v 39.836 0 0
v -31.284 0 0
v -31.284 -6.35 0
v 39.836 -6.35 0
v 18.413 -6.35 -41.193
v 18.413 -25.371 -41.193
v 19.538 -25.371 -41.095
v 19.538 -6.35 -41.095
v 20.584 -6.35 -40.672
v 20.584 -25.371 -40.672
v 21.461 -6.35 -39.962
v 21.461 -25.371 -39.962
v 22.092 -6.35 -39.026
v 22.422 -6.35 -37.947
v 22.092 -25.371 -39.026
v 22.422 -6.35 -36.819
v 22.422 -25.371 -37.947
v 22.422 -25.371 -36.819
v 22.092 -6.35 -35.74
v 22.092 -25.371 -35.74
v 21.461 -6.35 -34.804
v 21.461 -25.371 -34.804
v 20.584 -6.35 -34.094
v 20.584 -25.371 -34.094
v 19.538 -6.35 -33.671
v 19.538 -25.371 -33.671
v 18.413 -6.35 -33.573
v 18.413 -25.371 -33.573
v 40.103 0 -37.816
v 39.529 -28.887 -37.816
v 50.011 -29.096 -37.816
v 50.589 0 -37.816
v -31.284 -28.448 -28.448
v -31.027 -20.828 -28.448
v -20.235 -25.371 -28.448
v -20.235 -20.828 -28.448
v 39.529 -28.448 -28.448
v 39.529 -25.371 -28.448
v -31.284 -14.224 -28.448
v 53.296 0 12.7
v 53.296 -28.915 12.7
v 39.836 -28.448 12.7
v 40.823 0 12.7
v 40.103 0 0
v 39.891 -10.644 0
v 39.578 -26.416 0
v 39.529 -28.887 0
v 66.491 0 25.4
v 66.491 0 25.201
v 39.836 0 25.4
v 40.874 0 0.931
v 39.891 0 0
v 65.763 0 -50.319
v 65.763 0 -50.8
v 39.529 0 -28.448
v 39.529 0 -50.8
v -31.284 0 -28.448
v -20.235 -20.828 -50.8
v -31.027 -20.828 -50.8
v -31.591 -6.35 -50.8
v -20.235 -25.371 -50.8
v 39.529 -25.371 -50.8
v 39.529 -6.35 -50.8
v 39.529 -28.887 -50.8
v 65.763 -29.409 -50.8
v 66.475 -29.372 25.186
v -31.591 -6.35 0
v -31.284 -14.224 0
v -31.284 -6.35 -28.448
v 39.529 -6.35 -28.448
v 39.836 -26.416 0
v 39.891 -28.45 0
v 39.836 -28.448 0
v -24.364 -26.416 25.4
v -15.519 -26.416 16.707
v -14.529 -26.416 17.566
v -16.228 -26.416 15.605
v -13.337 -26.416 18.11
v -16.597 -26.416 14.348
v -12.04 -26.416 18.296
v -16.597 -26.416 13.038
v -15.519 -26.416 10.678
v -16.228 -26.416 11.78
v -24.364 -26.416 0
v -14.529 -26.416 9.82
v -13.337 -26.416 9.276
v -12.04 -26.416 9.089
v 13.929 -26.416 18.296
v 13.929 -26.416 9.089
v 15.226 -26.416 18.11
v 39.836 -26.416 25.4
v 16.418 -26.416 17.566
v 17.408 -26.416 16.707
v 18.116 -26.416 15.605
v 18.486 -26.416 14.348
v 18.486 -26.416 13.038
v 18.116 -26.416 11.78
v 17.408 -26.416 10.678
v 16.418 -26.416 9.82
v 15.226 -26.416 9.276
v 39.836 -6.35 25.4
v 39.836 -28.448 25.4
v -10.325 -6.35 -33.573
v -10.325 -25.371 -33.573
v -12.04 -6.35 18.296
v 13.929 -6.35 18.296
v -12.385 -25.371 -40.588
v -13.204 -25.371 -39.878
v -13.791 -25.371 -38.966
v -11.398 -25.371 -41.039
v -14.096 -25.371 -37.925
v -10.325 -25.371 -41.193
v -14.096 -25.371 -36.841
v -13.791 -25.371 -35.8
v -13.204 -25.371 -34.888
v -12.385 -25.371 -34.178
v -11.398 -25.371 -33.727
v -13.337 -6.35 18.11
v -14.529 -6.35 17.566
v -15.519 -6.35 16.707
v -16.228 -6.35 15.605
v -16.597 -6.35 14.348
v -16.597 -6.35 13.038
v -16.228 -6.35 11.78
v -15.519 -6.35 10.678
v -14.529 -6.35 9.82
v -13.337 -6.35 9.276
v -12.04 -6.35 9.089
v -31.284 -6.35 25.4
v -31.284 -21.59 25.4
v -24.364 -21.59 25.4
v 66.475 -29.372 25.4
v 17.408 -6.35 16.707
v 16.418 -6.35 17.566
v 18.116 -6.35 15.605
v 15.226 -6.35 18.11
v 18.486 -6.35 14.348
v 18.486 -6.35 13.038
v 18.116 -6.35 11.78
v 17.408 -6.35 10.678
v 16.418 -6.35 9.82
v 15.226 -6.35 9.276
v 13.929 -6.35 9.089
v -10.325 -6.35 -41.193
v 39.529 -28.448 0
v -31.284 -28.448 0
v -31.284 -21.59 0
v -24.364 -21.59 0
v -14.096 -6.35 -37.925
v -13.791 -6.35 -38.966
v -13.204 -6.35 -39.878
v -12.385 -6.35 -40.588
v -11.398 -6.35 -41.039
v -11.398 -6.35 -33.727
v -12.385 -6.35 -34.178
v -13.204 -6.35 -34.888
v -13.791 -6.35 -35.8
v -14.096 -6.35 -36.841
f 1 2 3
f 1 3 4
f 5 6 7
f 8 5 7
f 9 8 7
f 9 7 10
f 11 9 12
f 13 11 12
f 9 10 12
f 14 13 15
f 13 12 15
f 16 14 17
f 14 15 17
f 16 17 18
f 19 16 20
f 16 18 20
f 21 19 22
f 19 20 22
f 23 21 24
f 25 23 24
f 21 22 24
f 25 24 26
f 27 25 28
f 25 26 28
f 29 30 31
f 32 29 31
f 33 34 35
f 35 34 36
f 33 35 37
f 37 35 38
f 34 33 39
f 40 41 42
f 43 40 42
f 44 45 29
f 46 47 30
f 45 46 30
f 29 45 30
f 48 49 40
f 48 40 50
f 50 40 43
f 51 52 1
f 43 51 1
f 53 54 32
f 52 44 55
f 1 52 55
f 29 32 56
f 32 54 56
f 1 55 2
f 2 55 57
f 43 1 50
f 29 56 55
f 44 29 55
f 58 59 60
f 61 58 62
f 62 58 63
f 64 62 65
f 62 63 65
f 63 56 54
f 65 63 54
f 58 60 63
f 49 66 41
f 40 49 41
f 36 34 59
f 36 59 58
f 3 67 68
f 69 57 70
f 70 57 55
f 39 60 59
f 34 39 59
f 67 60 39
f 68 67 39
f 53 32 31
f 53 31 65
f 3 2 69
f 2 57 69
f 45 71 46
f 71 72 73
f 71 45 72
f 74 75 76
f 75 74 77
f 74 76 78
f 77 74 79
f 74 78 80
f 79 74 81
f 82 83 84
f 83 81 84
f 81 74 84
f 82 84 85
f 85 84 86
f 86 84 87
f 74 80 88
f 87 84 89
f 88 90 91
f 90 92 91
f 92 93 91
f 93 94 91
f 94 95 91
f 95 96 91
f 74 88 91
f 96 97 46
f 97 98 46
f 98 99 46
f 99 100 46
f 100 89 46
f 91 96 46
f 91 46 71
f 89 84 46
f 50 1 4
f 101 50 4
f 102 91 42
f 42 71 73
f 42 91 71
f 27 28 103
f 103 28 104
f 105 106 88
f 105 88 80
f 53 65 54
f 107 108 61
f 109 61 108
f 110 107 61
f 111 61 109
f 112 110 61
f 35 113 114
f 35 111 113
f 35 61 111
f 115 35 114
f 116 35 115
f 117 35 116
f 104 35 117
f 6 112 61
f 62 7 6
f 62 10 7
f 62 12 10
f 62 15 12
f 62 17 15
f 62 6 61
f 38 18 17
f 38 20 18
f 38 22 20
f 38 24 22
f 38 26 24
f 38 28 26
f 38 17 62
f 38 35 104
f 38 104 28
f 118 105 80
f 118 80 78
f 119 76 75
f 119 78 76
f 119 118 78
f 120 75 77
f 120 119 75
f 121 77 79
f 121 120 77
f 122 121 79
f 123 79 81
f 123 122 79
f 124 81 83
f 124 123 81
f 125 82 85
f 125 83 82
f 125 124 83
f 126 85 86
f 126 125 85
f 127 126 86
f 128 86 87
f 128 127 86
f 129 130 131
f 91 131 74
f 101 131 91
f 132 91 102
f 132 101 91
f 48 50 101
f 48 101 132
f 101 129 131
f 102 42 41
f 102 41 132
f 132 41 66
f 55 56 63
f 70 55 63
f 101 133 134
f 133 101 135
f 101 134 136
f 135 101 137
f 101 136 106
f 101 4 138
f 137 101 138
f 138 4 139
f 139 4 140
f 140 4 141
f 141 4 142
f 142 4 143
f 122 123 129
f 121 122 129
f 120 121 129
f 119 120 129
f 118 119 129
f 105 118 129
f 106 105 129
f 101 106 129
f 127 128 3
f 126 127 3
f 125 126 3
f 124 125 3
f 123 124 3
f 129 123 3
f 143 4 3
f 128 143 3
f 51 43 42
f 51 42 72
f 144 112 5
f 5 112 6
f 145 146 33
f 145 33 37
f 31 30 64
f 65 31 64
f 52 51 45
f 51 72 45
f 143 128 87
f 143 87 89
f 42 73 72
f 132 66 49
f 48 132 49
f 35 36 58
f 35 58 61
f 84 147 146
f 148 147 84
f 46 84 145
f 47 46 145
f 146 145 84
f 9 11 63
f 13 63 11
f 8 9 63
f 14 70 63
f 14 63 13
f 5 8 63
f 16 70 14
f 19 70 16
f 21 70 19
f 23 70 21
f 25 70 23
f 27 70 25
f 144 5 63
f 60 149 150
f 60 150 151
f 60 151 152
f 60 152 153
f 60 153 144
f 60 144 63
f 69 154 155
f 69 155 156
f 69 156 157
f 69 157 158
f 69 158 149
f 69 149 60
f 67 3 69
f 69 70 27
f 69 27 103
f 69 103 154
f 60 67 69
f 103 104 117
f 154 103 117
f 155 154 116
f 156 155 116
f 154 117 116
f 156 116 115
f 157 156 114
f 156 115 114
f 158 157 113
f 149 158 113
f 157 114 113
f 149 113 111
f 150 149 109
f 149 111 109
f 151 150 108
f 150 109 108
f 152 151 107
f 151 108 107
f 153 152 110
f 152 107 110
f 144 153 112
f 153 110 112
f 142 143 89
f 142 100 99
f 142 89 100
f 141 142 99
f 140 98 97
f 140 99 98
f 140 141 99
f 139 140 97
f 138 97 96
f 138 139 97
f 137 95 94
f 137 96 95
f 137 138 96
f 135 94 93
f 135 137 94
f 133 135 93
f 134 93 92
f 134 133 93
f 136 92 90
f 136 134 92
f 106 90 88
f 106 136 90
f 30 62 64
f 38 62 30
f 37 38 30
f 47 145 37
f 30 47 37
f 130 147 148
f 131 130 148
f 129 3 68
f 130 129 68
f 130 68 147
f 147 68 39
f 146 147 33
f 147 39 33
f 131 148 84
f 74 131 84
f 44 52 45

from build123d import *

# Parameters (mm, degrees)
F0_W      = 71.12
F0_H      = 28.448
F1_DEPTH  = 28.448
F3_DEPTH  = 25.4
F4_DEPTH  = 25.4
F6_DEPTH  = 29.3733245078
F8_DEPTH  = 29.3562148671
F9_W      = 26.5992027439
F9_H      = 25.4
F10_DEPTH = 29.3562148671
F12_DEPTH = 50.8
F14_DEPTH = 25.3715035059
F16_DEPTH = 29.4182237139
F18_DEPTH = 29.4182237139


with BuildPart() as f1:
    # F0 (on Front) → F1 (new body)
    with BuildSketch(Plane.XZ):
        with Locations((4.2755420916, -14.224)):
            Rectangle(F0_W, F0_H)
    extrude(amount=F1_DEPTH)

    # F2 (on face) → F3 (join)
    with BuildSketch(Plane.XY):
        Polygon((39.8355420916, -6.35), (-31.2844579084, -6.35), (-31.2844579084, -21.59), (-24.3643354625, -21.59), (-24.3643354625, -26.416), (39.8355420916, -26.416), align=None)
        Polygon((39.8355420916, 0), (39.8355420916, -6.35), (39.8355420916, -26.416), (39.8355420916, -28.448), (66.4746039532, -29.3723245078), (66.4906352758, 0), align=None)
    extrude(amount=-F3_DEPTH)

    # F2 (on face) → F4 (join)
    with BuildSketch(Plane.XY):
        Polygon((39.8355420916, -6.35), (-31.2844579084, -6.35), (-31.2844579084, -21.59), (-24.3643354625, -21.59), (-24.3643354625, -26.416), (39.8355420916, -26.416), (39.8355420916, -28.448), (66.4746039532, -29.3723245078), (66.4906352758, 0), (39.8355420916, 0), align=None)
    extrude(amount=F4_DEPTH)

    # F5 (on Front) → F6 (cut, through all)
    with BuildSketch(Plane.XZ):
        with BuildLine():
            Line((13.9288037957, 18.2963101068), (-12.0401520726, 18.2963101068))
            ThreePointArc((-12.0401520726, 18.2963101068), (-16.6437398491, 13.6927223303), (-12.0401520726, 9.0891345539))
            Line((-12.0401520726, 9.0891345539), (13.9288037957, 9.0891345539))
            ThreePointArc((13.9288037957, 9.0891345539), (18.5323915722, 13.6927223303), (13.9288037957, 18.2963101068))
        make_face()
        Polygon((69.9178975219, 28.448), (39.8913989174, 0), (69.9178975219, 0), align=None)
    extrude(amount=F6_DEPTH, mode=Mode.SUBTRACT)

    # F7 (on face) → F8 (cut, through all)
    with BuildSketch(Plane(origin=(-0.9380015967, -27.0332360006, 0), x_dir=(0.9993985644, -0.0346772191, 0), z_dir=(-0.0346772191, -0.9993985644, 0))):
        Polygon((54.266725333, 12.7), (40.7980811078, 12.7), (40.8539715481, 0), align=None)
    extrude(amount=-F8_DEPTH, mode=Mode.SUBTRACT)

    # F9 (on face) → F10 (cut, through all)
    with BuildSketch(Plane(origin=(-0.9380015967, -27.0332360006, 0), x_dir=(0.9993985644, -0.0346772191, 0), z_dir=(-0.0346772191, -0.9993985644, 0))):
        with Locations((54.15357292, -12.7)):
            Rectangle(F9_W, F9_H)
    extrude(amount=-F10_DEPTH, mode=Mode.SUBTRACT)

    # F11 (on Top) → F12 (join)
    with BuildSketch(Plane.XY):
        Polygon((39.5289533985, -6.35), (-31.5910466015, -6.35), (-31.0273190044, -20.828), (-20.2347878367, -20.828), (-20.2347878367, -25.3705035059), (33.4493406117, -25.3705035059), (39.5289533985, -25.3705035059), (39.5289533985, -28.8873665619), (65.7633790028, -29.4085801184), (65.7633790028, 0), (39.5289533985, 0), align=None)
    extrude(amount=-F12_DEPTH)

    # F13 (on face) → F14 (cut, through all)
    with BuildSketch(Plane.XZ.offset(25.3705035059)):
        with BuildLine():
            Line((18.4132819485, -33.5730523437), (-10.3250071326, -33.5730523437))
            ThreePointArc((-10.3250071326, -33.5730523437), (-14.1350071326, -37.3830523437), (-10.3250071326, -41.1930523437))
            Line((-10.3250071326, -41.1930523437), (18.4132819485, -41.1930523437))
            ThreePointArc((18.4132819485, -41.1930523437), (22.4639207193, -37.3830523437), (18.4132819485, -33.5730523437))
        make_face()
    extrude(amount=-F14_DEPTH, mode=Mode.SUBTRACT)

    # F15 (on face) → F16 (cut, through all)
    with BuildSketch(Plane(origin=(-0.5580978428, -28.0909353817, 0), x_dir=(0.9998026988, -0.0198636223, 0), z_dir=(-0.0198636223, -0.9998026988, 0))):
        Polygon((66.3345647354, 0), (40.0949620257, 0), (40.0949620257, -29.1759762913), (66.3345647354, -50.8), align=None)
    extrude(amount=-F16_DEPTH, mode=Mode.SUBTRACT)

    # F17 (on face) → F18 (cut, through all)
    with BuildSketch(Plane(origin=(-0.5580978428, -28.0909353817, 0), x_dir=(0.9998026988, -0.0198636223, 0), z_dir=(-0.0198636223, -0.9998026988, 0))):
        Polygon((50.5786476823, -37.8155685024), (40.0949620257, -29.1759762913), (40.0949620257, -37.8155685024), align=None)
    extrude(amount=-F18_DEPTH, mode=Mode.SUBTRACT)


solid = f1.part
